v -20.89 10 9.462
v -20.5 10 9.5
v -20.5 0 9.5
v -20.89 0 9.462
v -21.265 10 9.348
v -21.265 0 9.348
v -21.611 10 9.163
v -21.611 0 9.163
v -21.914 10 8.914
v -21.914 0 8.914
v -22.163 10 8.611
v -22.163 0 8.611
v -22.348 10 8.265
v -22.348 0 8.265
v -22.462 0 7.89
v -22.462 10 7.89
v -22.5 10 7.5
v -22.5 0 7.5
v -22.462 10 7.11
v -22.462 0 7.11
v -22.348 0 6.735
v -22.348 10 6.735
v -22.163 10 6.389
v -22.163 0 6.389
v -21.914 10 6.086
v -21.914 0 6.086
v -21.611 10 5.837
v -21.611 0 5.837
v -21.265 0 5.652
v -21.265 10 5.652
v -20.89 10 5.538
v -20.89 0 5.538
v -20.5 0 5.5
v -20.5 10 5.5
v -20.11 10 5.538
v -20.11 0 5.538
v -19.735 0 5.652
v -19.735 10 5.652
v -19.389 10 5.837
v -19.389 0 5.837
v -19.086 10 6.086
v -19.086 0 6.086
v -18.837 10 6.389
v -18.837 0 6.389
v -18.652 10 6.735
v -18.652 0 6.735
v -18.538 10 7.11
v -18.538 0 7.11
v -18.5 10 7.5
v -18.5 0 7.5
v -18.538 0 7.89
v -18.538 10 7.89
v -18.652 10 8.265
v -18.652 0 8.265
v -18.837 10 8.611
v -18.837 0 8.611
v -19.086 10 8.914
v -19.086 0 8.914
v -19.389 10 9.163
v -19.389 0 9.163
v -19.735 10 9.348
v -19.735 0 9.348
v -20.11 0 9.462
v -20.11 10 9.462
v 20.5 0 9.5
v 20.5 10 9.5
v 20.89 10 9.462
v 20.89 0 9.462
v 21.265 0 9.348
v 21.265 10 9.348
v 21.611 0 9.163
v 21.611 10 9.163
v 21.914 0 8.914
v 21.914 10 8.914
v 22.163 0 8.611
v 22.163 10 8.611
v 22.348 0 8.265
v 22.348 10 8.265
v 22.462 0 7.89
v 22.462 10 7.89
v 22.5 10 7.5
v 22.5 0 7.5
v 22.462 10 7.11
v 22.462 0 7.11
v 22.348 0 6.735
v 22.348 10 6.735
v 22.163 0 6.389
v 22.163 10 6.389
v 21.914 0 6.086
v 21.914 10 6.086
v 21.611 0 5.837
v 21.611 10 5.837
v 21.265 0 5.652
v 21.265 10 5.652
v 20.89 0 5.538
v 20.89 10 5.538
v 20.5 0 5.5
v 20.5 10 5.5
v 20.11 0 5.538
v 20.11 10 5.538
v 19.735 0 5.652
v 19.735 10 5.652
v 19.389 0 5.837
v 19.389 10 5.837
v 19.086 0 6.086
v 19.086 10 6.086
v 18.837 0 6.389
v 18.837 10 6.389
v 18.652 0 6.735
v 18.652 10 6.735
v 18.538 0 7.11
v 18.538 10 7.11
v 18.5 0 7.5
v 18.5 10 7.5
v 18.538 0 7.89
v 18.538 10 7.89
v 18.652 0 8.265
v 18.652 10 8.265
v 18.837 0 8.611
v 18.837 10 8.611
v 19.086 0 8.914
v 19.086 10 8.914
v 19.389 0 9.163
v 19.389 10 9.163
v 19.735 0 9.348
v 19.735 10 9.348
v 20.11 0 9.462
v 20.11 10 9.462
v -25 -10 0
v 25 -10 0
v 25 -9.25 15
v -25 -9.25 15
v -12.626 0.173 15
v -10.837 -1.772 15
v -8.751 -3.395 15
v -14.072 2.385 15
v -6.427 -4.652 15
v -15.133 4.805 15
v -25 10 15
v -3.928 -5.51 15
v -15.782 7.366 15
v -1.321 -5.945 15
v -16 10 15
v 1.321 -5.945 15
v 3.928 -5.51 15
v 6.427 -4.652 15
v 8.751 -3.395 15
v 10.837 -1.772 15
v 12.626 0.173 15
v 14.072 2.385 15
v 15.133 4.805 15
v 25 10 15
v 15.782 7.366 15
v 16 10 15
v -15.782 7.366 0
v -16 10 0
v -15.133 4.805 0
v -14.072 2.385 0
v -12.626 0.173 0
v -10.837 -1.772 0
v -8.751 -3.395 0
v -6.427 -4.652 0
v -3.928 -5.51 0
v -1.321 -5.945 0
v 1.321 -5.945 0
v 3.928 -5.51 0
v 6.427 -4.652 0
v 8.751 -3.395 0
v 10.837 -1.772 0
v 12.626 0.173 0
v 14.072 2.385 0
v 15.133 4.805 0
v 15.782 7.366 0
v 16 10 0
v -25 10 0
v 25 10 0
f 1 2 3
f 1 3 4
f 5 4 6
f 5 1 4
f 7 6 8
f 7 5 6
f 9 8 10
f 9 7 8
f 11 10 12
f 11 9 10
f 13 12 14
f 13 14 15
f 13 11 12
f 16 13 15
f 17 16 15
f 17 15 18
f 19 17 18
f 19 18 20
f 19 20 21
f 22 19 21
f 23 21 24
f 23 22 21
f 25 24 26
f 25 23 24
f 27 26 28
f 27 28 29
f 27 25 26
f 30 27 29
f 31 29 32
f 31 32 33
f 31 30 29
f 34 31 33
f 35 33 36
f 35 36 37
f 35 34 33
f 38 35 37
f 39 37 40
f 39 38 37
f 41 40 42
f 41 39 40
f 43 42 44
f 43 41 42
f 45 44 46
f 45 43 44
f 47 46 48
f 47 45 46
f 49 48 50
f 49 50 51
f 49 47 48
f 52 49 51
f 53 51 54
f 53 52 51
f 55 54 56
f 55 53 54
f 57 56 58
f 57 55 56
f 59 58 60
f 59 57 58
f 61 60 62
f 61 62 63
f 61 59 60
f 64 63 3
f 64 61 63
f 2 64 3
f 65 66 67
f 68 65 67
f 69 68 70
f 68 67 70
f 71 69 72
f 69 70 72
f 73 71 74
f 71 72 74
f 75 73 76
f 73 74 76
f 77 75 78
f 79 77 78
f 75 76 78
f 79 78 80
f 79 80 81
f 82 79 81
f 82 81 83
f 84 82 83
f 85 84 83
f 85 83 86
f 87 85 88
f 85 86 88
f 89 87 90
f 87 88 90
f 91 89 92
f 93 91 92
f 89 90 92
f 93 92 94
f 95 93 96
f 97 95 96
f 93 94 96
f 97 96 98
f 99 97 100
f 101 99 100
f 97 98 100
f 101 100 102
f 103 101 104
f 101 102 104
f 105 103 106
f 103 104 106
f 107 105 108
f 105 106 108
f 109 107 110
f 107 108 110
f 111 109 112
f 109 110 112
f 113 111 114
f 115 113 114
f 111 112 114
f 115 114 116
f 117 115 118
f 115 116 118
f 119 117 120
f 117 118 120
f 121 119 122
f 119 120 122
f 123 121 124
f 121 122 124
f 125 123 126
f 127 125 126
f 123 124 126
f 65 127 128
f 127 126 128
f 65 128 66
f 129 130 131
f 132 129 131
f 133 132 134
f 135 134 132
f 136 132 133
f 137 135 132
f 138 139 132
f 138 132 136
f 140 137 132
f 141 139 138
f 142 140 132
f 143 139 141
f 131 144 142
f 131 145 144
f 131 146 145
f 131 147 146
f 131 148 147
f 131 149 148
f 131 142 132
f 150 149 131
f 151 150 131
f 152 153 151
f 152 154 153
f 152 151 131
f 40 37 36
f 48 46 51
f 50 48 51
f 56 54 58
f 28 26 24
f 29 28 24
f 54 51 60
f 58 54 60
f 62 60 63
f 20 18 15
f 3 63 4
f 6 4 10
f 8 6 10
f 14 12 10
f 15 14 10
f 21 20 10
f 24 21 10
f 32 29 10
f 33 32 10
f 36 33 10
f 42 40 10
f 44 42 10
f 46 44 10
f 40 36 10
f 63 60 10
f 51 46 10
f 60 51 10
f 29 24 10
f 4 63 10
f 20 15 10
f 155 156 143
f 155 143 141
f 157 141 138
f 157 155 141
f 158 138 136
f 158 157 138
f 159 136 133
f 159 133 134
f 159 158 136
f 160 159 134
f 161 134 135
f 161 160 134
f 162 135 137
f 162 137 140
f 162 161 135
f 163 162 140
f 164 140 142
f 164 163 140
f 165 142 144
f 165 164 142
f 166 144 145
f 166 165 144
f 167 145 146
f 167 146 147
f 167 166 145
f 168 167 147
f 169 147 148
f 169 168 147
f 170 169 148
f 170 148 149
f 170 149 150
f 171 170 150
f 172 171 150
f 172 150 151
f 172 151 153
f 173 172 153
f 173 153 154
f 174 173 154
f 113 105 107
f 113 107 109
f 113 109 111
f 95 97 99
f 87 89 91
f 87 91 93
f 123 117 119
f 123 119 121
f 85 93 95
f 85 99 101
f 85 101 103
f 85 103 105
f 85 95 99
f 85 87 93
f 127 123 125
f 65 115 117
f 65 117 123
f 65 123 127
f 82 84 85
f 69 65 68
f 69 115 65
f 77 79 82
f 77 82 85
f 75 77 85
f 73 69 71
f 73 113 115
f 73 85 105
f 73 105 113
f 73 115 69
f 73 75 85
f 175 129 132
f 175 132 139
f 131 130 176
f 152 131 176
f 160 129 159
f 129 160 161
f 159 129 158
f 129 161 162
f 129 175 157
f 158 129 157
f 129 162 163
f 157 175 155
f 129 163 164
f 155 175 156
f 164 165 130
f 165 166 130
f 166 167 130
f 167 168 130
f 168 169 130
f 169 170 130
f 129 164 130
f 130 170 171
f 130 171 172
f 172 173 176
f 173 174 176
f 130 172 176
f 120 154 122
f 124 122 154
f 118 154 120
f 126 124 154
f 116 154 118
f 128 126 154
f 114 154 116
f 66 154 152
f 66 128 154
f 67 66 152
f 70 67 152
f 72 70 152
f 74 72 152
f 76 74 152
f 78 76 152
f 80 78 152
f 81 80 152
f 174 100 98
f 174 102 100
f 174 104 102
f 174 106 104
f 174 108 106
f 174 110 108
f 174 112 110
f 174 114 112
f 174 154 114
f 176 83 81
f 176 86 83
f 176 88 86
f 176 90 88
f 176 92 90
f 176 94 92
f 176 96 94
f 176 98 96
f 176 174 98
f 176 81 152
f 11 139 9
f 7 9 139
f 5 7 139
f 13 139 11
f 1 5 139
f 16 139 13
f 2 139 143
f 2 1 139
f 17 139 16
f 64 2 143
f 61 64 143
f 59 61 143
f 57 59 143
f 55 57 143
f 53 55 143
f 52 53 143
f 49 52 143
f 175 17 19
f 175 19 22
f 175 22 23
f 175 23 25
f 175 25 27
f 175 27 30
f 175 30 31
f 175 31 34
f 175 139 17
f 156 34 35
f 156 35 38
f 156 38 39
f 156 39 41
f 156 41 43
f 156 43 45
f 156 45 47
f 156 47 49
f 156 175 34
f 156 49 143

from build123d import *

# Parameters (mm, degrees)
SKETCH1_W               = 50
SKETCH1_H               = 20
BOSS_EXTRUDE1_DEPTH     = 15
CUT_EXTRUDE1_DEPTH      = 54.150729064
CUT_EXTRUDE1_DEPTH_BACK = 54.150729064
CUT_EXTRUDE2_DEPTH      = 15
SKETCH4_R               = 2
CUT_EXTRUDE3_DEPTH      = 10


with BuildPart() as part:
    # Sketch1 → Boss-Extrude1 (new body)
    with BuildSketch(Plane.XY):
        Rectangle(SKETCH1_W, SKETCH1_H)
    extrude(amount=BOSS_EXTRUDE1_DEPTH)

    # Sketch2 → Cut-Extrude1 (cut, two sides: drawn at the far end of the back side and taken through both)
    with BuildSketch(Plane(origin=(25, 0, 0), x_dir=(0, 0, -1), z_dir=(1, 0, 0)).offset(-CUT_EXTRUDE1_DEPTH_BACK)):
        Polygon((59.925140333, -12.996257017), (0, -10), (-15, -9.25), (-74.925140333, -6.253742983), (-80.917654366, -126.104023649), (53.932626299, -132.846537682), align=None)
    extrude(amount=CUT_EXTRUDE1_DEPTH + CUT_EXTRUDE1_DEPTH_BACK, mode=Mode.SUBTRACT)

    # Sketch3 → Cut-Extrude2 (cut)
    with BuildSketch(Plane(origin=(0, 0, 0), x_dir=(-1, 0, 0), z_dir=(0, 0, -1))):
        with BuildLine():
            Line((-16, 10), (16, 10))
            ThreePointArc((16, 10), (0, -6), (-16, 10))
        make_face()
    extrude(amount=-CUT_EXTRUDE2_DEPTH, mode=Mode.SUBTRACT)

    # Sketch4 → Cut-Extrude3 (cut)
    with BuildSketch(Plane(origin=(0, 10, 0), x_dir=(1, 0, 0), z_dir=(0, 1, 0))):
        with Locations(Location((20.5, -7.5, 0), (0, 0, 270))):
            Circle(SKETCH4_R)
    cut_extrude3 = extrude(amount=-CUT_EXTRUDE3_DEPTH, mode=Mode.SUBTRACT)

    # Mirror1: Cut-Extrude3 across plane
    add(cut_extrude3.mirror(Plane(origin=(0, 0, 0), x_dir=(0, 0, 1), z_dir=(1, 0, 0))), mode=Mode.SUBTRACT)


solid = part.part
